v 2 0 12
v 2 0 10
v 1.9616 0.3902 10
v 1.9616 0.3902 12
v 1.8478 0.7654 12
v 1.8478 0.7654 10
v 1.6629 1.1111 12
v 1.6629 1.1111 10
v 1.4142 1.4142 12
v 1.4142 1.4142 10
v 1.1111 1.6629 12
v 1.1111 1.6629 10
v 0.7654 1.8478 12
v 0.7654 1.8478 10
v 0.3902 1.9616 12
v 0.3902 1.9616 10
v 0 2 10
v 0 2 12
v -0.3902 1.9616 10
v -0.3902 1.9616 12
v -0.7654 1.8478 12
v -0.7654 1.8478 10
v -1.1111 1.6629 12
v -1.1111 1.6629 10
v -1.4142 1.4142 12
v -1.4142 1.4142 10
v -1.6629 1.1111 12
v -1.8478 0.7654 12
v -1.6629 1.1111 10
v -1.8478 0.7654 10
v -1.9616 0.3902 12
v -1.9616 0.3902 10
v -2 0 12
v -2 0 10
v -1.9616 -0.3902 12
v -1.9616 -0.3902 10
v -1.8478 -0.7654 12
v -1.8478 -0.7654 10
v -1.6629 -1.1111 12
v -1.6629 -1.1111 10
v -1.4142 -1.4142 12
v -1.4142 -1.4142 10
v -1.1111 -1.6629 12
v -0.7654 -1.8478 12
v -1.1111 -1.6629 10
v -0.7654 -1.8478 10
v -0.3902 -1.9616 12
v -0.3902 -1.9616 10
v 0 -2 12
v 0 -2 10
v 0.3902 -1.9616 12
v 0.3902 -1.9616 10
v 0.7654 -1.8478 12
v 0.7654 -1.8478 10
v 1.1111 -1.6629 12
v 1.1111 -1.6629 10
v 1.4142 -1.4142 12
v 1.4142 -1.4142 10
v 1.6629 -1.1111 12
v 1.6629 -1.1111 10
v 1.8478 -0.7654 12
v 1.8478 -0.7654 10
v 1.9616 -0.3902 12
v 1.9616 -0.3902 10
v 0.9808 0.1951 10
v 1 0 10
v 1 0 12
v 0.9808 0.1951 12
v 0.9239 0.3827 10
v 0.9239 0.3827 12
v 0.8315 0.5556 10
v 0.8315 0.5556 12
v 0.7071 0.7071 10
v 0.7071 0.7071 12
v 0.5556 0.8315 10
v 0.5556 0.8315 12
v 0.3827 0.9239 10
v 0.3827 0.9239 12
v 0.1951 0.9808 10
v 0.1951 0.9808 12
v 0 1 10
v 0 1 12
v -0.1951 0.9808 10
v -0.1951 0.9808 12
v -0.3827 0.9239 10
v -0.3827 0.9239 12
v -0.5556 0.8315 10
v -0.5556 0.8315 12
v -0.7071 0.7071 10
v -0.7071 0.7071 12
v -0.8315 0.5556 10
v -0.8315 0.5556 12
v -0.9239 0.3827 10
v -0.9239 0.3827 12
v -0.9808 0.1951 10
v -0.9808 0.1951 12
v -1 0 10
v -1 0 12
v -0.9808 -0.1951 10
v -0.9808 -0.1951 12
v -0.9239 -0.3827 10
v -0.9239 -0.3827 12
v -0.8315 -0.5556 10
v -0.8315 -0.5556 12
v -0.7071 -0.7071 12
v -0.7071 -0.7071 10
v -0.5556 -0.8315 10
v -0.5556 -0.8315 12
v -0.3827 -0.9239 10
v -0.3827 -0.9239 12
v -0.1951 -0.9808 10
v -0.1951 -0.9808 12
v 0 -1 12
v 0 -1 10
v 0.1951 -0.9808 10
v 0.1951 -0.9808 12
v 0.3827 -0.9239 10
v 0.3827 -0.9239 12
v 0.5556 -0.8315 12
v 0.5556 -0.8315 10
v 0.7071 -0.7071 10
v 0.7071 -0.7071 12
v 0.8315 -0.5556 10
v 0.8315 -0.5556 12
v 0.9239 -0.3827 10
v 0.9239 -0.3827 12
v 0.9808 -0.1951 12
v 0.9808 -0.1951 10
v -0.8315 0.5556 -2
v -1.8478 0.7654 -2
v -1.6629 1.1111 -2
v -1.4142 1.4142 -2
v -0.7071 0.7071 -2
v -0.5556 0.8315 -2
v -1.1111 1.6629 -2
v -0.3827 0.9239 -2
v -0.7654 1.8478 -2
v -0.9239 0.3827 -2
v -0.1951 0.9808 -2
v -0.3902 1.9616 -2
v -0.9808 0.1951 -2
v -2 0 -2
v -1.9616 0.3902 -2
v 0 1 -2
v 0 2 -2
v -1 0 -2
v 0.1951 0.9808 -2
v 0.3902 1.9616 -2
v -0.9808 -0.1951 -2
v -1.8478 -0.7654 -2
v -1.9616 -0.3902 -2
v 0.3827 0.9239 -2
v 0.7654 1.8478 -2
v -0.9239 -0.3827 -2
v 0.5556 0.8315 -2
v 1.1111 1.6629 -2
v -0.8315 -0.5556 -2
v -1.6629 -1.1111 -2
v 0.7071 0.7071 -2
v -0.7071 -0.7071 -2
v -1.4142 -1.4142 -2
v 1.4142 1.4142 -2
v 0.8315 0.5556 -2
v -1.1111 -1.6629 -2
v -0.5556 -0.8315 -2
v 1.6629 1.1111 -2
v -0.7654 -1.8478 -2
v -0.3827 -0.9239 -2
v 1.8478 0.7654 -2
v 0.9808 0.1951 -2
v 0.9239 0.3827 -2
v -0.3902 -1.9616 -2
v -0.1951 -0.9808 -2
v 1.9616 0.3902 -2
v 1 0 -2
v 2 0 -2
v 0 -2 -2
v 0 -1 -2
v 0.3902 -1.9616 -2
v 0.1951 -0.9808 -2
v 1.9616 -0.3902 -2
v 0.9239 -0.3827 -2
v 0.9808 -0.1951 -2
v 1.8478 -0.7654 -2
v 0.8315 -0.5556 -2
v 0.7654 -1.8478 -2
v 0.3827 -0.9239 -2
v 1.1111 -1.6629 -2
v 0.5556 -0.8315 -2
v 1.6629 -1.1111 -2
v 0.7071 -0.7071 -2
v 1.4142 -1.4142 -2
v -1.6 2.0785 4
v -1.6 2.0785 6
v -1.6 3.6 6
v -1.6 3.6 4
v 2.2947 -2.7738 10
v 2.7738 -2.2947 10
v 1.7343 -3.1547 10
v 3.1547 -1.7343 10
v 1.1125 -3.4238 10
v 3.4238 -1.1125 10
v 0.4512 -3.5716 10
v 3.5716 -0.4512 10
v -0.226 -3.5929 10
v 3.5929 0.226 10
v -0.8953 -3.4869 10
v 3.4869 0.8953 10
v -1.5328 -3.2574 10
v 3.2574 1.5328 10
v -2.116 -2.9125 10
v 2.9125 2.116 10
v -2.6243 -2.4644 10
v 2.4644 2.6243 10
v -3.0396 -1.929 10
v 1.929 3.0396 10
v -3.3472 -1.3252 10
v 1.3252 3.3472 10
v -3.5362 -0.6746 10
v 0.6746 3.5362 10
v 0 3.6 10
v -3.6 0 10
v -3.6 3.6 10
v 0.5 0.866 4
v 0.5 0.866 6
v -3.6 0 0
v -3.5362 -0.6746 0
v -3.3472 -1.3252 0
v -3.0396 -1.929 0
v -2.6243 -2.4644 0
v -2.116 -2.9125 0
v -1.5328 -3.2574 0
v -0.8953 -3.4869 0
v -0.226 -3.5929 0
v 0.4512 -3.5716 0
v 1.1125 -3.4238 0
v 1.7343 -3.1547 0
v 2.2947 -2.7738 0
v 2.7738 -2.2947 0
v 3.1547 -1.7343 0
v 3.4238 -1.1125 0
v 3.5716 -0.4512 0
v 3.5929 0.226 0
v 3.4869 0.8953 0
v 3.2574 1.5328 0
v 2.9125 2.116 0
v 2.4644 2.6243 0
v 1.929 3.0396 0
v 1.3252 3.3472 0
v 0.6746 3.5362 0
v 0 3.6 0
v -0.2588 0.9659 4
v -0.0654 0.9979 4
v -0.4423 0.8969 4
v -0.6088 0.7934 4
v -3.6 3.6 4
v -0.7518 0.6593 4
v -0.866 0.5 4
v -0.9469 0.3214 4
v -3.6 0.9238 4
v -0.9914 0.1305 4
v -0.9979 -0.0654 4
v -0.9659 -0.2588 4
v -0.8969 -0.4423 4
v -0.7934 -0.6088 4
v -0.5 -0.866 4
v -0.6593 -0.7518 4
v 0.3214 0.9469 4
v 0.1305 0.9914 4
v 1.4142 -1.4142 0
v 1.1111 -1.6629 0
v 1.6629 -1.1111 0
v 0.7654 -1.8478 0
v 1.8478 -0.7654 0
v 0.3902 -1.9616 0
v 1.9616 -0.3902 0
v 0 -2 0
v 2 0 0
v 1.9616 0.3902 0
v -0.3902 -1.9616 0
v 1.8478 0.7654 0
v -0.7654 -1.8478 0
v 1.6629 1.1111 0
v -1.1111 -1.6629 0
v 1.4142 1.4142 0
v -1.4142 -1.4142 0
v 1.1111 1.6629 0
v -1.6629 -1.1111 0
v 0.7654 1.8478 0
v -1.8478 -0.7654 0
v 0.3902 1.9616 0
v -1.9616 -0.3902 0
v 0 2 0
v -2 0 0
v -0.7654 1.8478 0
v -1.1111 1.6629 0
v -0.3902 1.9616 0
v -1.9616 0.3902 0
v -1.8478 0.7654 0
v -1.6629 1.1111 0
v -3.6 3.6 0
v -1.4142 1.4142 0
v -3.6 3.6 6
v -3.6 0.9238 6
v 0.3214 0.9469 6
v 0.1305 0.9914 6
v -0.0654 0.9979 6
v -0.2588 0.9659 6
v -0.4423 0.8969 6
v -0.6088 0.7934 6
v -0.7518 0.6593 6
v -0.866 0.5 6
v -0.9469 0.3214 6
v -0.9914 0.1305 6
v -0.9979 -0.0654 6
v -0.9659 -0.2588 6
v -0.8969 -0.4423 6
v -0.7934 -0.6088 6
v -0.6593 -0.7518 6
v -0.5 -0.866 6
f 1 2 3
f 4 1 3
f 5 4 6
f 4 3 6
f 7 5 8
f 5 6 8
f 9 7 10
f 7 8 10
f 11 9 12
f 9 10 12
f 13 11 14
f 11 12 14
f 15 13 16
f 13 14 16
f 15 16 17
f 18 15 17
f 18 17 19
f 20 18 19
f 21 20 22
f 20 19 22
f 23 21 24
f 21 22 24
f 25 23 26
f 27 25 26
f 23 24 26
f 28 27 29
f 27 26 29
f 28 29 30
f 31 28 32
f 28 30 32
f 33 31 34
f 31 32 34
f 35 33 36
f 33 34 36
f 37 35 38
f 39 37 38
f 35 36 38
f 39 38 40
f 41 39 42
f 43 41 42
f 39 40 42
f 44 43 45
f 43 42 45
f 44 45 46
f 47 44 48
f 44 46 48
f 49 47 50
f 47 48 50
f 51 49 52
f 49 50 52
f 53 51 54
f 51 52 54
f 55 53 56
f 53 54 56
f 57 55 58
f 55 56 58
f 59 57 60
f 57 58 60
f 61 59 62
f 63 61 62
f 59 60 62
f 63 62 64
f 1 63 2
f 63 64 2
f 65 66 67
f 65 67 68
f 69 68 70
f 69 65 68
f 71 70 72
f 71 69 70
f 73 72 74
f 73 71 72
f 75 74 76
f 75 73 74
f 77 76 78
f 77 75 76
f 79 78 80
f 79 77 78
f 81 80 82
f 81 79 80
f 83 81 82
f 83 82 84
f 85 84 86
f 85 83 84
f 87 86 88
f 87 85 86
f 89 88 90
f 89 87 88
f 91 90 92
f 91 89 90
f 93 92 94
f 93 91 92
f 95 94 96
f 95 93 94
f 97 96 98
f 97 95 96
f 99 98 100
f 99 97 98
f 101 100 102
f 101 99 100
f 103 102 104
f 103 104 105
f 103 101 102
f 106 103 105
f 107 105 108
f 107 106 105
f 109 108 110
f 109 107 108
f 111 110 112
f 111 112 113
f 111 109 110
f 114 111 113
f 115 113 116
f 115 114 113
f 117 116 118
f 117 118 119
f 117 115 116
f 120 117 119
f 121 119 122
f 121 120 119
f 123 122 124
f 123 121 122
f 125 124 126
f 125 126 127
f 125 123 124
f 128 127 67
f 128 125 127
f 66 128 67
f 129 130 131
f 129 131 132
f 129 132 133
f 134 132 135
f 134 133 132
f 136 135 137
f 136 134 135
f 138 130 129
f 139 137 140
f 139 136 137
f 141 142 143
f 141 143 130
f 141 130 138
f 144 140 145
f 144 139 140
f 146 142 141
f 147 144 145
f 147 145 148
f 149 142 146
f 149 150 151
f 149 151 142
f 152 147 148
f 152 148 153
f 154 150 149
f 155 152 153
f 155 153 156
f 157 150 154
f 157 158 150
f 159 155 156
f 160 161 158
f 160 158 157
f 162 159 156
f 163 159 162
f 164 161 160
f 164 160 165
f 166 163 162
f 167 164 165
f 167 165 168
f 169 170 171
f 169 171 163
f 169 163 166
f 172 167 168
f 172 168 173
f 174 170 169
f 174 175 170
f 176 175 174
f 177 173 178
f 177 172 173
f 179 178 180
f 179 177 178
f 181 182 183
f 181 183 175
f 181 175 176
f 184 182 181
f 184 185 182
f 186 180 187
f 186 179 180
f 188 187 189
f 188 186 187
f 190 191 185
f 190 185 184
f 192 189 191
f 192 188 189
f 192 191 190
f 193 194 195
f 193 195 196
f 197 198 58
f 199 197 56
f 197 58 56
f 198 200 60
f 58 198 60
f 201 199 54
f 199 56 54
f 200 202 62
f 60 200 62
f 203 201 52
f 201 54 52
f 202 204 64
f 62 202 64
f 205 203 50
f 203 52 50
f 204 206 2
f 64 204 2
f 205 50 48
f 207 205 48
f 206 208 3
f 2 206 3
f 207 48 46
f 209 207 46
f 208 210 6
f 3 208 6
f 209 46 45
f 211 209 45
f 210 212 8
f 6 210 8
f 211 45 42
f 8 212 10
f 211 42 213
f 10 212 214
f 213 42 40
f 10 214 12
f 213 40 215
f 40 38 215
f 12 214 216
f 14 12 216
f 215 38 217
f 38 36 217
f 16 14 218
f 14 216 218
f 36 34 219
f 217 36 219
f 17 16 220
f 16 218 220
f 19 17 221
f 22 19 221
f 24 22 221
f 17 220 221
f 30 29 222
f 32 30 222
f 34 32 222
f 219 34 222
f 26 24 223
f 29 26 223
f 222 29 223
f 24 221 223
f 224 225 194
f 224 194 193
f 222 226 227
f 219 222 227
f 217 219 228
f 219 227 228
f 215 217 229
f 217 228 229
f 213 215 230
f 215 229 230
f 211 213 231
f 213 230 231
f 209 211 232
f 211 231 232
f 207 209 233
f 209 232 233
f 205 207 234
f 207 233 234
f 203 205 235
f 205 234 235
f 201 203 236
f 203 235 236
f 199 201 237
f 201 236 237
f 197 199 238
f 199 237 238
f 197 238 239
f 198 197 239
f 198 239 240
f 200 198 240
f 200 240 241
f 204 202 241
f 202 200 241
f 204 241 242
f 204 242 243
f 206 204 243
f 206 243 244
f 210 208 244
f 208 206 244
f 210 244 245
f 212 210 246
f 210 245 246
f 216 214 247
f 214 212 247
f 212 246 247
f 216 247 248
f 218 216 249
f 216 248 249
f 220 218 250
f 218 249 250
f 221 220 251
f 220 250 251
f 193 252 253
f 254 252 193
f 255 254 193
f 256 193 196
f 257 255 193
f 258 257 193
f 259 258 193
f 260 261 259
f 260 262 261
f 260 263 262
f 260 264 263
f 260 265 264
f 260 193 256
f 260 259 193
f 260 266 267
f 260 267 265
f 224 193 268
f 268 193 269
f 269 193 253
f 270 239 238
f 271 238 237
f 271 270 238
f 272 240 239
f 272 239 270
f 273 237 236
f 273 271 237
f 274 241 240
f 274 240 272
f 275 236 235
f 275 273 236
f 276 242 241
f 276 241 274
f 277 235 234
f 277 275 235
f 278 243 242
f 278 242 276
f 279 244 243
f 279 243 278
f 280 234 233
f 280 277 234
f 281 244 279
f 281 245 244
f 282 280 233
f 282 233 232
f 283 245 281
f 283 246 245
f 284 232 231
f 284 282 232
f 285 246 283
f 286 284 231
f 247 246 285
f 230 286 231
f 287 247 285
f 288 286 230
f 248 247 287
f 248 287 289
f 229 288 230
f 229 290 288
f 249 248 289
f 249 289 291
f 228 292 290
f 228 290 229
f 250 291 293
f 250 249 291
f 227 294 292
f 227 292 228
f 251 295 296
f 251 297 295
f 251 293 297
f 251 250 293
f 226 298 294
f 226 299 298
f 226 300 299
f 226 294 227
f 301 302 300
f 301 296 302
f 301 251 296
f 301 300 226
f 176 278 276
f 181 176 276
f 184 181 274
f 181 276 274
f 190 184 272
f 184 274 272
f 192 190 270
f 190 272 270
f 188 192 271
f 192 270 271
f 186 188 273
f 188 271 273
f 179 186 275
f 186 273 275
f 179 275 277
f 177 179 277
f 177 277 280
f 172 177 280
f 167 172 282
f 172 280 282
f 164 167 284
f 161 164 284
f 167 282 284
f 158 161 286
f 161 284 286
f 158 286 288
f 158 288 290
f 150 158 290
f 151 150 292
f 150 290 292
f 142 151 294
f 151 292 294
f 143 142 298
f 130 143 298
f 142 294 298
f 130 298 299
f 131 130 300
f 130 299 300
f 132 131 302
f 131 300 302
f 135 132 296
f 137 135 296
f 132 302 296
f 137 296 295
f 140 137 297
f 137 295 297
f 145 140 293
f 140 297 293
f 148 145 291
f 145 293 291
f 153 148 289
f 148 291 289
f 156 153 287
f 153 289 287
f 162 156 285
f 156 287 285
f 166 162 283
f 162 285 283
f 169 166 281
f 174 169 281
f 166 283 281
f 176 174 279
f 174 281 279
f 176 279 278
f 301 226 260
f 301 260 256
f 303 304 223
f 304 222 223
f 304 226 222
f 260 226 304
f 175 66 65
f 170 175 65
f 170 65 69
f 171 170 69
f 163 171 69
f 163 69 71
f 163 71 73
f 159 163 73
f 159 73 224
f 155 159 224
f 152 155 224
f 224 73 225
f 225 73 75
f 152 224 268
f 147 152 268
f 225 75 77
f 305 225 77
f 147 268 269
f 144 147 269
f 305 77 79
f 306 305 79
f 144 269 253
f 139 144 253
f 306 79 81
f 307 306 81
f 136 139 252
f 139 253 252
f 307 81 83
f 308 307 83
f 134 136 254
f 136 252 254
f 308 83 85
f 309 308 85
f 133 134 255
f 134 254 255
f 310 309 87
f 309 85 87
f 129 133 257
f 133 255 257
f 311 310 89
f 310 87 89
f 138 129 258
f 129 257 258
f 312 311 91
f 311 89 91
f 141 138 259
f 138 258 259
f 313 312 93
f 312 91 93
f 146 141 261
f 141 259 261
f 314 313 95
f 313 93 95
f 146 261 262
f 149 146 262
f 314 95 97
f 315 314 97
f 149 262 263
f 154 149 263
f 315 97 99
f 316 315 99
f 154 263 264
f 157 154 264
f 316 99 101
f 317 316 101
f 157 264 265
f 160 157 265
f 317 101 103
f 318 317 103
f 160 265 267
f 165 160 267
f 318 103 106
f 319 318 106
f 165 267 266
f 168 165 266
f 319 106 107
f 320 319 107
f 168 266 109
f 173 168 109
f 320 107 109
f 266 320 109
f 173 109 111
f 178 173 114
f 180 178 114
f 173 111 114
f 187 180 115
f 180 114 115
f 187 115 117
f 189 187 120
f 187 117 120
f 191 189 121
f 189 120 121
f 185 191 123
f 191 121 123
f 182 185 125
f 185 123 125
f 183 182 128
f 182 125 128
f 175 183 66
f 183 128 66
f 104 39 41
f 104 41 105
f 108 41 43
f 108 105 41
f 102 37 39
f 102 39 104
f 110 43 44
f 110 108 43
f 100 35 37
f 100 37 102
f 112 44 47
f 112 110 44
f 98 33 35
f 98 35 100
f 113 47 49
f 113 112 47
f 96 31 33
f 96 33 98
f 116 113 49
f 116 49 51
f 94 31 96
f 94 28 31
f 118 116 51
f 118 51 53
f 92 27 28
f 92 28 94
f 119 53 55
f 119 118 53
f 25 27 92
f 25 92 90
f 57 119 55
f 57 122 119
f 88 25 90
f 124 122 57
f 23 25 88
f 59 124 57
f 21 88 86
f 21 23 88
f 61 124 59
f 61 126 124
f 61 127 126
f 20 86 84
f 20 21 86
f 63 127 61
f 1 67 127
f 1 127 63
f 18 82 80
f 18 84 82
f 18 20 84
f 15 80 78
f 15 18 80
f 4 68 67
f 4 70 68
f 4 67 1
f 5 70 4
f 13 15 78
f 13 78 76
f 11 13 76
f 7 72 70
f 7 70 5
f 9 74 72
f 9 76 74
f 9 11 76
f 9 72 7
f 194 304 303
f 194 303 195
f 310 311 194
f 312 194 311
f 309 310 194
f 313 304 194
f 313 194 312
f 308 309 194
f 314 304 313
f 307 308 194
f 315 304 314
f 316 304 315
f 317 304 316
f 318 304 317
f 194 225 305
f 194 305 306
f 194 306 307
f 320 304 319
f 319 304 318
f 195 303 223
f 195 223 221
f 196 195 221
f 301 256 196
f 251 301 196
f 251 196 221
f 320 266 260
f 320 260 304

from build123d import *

# Parameters (mm, degrees)
SKETCH_1_R               = 3.6
EXTRUDE_1_DEPTH          = 10
SKETCH_2_R               = 2
SKETCH_2_R_2             = 1
EXTRUDE_2_DEPTH          = 2
SKETCH_4_R               = 2
EXTRUDE_3_DEPTH          = 2
SKETCH_5_R               = 1.8
EXTRUDE_4_DEPTH          = 3.6
SKETCH_2_3_R             = 1
CUT_EXTRUDE_2_DEPTH      = 3
CUT_EXTRUDE_2_DEPTH_BACK = 13
EXTRUDE_5_DEPTH          = 10
SKETCH_10_W              = 2
SKETCH_10_H              = 2


with BuildPart() as part:
    # Sketch 1 → Extrude 1 (new body)
    with BuildSketch(Plane.XY):
        Circle(SKETCH_1_R)
    extrude(amount=EXTRUDE_1_DEPTH)

    # Sketch 2 → Extrude 2 (add)
    with BuildSketch(Plane.XY.offset(10)):
        Circle(SKETCH_2_R)
        Circle(SKETCH_2_R_2, mode=Mode.SUBTRACT)
    extrude(amount=EXTRUDE_2_DEPTH)

    # Sketch 4 → Extrude 3 (add)
    with BuildSketch(Plane(origin=(0, 0, 0), x_dir=(-1, 0, 0), z_dir=(0, 0, -1))):
        with Locations(Location((0, 0, 0), (0, 0, 180))):  # turned: the seam where the file's is
            Circle(SKETCH_4_R)
    extrude(amount=EXTRUDE_3_DEPTH)

    # Sketch 5 → Extrude 4 (add)
    with BuildSketch(Plane(origin=(0, 0, 0), x_dir=(1, 0, 0), z_dir=(0, 1, 0))):
        with Locations((-1.8, -5)):
            Circle(SKETCH_5_R)
    extrude(amount=EXTRUDE_4_DEPTH)

    # Sketch 2_3 → Cut-Extrude 2 (cut, two sides)
    with BuildSketch(Plane.XY.offset(10)) as cut_extrude_2_sk:
        Circle(SKETCH_2_3_R)
    extrude(amount=CUT_EXTRUDE_2_DEPTH, mode=Mode.SUBTRACT)
    extrude(cut_extrude_2_sk.sketch, amount=-CUT_EXTRUDE_2_DEPTH_BACK, mode=Mode.SUBTRACT)

    # Sketch 8 → Extrude 5 (add)
    with BuildSketch(Plane.XY.offset(10)):
        Polygon((0, 3.6), (-3.6, 0), (-3.6, 3.6), align=None)
    extrude(amount=-EXTRUDE_5_DEPTH)

    # Sweep 1: sweep along a path in Sketch 11
    with BuildLine(Plane.XY.offset(5)) as sweep_1_path:
        Line((-2.6, 3.6), (-2.6, 1.5011107))
        Line((-2.6, 1.5011107), (0, 0))
    # Sketch 10 → Sweep 1 (sweep, cut)
    with BuildSketch(Plane(origin=(0, 3.6, 0), x_dir=(1, 0, 0), z_dir=(0, 1, 0))):
        with Locations((-2.6, -5)):
            Rectangle(SKETCH_10_W, SKETCH_10_H)
    sweep(path=sweep_1_path.line, transition=Transition.RIGHT, mode=Mode.SUBTRACT)


solid = part.part
